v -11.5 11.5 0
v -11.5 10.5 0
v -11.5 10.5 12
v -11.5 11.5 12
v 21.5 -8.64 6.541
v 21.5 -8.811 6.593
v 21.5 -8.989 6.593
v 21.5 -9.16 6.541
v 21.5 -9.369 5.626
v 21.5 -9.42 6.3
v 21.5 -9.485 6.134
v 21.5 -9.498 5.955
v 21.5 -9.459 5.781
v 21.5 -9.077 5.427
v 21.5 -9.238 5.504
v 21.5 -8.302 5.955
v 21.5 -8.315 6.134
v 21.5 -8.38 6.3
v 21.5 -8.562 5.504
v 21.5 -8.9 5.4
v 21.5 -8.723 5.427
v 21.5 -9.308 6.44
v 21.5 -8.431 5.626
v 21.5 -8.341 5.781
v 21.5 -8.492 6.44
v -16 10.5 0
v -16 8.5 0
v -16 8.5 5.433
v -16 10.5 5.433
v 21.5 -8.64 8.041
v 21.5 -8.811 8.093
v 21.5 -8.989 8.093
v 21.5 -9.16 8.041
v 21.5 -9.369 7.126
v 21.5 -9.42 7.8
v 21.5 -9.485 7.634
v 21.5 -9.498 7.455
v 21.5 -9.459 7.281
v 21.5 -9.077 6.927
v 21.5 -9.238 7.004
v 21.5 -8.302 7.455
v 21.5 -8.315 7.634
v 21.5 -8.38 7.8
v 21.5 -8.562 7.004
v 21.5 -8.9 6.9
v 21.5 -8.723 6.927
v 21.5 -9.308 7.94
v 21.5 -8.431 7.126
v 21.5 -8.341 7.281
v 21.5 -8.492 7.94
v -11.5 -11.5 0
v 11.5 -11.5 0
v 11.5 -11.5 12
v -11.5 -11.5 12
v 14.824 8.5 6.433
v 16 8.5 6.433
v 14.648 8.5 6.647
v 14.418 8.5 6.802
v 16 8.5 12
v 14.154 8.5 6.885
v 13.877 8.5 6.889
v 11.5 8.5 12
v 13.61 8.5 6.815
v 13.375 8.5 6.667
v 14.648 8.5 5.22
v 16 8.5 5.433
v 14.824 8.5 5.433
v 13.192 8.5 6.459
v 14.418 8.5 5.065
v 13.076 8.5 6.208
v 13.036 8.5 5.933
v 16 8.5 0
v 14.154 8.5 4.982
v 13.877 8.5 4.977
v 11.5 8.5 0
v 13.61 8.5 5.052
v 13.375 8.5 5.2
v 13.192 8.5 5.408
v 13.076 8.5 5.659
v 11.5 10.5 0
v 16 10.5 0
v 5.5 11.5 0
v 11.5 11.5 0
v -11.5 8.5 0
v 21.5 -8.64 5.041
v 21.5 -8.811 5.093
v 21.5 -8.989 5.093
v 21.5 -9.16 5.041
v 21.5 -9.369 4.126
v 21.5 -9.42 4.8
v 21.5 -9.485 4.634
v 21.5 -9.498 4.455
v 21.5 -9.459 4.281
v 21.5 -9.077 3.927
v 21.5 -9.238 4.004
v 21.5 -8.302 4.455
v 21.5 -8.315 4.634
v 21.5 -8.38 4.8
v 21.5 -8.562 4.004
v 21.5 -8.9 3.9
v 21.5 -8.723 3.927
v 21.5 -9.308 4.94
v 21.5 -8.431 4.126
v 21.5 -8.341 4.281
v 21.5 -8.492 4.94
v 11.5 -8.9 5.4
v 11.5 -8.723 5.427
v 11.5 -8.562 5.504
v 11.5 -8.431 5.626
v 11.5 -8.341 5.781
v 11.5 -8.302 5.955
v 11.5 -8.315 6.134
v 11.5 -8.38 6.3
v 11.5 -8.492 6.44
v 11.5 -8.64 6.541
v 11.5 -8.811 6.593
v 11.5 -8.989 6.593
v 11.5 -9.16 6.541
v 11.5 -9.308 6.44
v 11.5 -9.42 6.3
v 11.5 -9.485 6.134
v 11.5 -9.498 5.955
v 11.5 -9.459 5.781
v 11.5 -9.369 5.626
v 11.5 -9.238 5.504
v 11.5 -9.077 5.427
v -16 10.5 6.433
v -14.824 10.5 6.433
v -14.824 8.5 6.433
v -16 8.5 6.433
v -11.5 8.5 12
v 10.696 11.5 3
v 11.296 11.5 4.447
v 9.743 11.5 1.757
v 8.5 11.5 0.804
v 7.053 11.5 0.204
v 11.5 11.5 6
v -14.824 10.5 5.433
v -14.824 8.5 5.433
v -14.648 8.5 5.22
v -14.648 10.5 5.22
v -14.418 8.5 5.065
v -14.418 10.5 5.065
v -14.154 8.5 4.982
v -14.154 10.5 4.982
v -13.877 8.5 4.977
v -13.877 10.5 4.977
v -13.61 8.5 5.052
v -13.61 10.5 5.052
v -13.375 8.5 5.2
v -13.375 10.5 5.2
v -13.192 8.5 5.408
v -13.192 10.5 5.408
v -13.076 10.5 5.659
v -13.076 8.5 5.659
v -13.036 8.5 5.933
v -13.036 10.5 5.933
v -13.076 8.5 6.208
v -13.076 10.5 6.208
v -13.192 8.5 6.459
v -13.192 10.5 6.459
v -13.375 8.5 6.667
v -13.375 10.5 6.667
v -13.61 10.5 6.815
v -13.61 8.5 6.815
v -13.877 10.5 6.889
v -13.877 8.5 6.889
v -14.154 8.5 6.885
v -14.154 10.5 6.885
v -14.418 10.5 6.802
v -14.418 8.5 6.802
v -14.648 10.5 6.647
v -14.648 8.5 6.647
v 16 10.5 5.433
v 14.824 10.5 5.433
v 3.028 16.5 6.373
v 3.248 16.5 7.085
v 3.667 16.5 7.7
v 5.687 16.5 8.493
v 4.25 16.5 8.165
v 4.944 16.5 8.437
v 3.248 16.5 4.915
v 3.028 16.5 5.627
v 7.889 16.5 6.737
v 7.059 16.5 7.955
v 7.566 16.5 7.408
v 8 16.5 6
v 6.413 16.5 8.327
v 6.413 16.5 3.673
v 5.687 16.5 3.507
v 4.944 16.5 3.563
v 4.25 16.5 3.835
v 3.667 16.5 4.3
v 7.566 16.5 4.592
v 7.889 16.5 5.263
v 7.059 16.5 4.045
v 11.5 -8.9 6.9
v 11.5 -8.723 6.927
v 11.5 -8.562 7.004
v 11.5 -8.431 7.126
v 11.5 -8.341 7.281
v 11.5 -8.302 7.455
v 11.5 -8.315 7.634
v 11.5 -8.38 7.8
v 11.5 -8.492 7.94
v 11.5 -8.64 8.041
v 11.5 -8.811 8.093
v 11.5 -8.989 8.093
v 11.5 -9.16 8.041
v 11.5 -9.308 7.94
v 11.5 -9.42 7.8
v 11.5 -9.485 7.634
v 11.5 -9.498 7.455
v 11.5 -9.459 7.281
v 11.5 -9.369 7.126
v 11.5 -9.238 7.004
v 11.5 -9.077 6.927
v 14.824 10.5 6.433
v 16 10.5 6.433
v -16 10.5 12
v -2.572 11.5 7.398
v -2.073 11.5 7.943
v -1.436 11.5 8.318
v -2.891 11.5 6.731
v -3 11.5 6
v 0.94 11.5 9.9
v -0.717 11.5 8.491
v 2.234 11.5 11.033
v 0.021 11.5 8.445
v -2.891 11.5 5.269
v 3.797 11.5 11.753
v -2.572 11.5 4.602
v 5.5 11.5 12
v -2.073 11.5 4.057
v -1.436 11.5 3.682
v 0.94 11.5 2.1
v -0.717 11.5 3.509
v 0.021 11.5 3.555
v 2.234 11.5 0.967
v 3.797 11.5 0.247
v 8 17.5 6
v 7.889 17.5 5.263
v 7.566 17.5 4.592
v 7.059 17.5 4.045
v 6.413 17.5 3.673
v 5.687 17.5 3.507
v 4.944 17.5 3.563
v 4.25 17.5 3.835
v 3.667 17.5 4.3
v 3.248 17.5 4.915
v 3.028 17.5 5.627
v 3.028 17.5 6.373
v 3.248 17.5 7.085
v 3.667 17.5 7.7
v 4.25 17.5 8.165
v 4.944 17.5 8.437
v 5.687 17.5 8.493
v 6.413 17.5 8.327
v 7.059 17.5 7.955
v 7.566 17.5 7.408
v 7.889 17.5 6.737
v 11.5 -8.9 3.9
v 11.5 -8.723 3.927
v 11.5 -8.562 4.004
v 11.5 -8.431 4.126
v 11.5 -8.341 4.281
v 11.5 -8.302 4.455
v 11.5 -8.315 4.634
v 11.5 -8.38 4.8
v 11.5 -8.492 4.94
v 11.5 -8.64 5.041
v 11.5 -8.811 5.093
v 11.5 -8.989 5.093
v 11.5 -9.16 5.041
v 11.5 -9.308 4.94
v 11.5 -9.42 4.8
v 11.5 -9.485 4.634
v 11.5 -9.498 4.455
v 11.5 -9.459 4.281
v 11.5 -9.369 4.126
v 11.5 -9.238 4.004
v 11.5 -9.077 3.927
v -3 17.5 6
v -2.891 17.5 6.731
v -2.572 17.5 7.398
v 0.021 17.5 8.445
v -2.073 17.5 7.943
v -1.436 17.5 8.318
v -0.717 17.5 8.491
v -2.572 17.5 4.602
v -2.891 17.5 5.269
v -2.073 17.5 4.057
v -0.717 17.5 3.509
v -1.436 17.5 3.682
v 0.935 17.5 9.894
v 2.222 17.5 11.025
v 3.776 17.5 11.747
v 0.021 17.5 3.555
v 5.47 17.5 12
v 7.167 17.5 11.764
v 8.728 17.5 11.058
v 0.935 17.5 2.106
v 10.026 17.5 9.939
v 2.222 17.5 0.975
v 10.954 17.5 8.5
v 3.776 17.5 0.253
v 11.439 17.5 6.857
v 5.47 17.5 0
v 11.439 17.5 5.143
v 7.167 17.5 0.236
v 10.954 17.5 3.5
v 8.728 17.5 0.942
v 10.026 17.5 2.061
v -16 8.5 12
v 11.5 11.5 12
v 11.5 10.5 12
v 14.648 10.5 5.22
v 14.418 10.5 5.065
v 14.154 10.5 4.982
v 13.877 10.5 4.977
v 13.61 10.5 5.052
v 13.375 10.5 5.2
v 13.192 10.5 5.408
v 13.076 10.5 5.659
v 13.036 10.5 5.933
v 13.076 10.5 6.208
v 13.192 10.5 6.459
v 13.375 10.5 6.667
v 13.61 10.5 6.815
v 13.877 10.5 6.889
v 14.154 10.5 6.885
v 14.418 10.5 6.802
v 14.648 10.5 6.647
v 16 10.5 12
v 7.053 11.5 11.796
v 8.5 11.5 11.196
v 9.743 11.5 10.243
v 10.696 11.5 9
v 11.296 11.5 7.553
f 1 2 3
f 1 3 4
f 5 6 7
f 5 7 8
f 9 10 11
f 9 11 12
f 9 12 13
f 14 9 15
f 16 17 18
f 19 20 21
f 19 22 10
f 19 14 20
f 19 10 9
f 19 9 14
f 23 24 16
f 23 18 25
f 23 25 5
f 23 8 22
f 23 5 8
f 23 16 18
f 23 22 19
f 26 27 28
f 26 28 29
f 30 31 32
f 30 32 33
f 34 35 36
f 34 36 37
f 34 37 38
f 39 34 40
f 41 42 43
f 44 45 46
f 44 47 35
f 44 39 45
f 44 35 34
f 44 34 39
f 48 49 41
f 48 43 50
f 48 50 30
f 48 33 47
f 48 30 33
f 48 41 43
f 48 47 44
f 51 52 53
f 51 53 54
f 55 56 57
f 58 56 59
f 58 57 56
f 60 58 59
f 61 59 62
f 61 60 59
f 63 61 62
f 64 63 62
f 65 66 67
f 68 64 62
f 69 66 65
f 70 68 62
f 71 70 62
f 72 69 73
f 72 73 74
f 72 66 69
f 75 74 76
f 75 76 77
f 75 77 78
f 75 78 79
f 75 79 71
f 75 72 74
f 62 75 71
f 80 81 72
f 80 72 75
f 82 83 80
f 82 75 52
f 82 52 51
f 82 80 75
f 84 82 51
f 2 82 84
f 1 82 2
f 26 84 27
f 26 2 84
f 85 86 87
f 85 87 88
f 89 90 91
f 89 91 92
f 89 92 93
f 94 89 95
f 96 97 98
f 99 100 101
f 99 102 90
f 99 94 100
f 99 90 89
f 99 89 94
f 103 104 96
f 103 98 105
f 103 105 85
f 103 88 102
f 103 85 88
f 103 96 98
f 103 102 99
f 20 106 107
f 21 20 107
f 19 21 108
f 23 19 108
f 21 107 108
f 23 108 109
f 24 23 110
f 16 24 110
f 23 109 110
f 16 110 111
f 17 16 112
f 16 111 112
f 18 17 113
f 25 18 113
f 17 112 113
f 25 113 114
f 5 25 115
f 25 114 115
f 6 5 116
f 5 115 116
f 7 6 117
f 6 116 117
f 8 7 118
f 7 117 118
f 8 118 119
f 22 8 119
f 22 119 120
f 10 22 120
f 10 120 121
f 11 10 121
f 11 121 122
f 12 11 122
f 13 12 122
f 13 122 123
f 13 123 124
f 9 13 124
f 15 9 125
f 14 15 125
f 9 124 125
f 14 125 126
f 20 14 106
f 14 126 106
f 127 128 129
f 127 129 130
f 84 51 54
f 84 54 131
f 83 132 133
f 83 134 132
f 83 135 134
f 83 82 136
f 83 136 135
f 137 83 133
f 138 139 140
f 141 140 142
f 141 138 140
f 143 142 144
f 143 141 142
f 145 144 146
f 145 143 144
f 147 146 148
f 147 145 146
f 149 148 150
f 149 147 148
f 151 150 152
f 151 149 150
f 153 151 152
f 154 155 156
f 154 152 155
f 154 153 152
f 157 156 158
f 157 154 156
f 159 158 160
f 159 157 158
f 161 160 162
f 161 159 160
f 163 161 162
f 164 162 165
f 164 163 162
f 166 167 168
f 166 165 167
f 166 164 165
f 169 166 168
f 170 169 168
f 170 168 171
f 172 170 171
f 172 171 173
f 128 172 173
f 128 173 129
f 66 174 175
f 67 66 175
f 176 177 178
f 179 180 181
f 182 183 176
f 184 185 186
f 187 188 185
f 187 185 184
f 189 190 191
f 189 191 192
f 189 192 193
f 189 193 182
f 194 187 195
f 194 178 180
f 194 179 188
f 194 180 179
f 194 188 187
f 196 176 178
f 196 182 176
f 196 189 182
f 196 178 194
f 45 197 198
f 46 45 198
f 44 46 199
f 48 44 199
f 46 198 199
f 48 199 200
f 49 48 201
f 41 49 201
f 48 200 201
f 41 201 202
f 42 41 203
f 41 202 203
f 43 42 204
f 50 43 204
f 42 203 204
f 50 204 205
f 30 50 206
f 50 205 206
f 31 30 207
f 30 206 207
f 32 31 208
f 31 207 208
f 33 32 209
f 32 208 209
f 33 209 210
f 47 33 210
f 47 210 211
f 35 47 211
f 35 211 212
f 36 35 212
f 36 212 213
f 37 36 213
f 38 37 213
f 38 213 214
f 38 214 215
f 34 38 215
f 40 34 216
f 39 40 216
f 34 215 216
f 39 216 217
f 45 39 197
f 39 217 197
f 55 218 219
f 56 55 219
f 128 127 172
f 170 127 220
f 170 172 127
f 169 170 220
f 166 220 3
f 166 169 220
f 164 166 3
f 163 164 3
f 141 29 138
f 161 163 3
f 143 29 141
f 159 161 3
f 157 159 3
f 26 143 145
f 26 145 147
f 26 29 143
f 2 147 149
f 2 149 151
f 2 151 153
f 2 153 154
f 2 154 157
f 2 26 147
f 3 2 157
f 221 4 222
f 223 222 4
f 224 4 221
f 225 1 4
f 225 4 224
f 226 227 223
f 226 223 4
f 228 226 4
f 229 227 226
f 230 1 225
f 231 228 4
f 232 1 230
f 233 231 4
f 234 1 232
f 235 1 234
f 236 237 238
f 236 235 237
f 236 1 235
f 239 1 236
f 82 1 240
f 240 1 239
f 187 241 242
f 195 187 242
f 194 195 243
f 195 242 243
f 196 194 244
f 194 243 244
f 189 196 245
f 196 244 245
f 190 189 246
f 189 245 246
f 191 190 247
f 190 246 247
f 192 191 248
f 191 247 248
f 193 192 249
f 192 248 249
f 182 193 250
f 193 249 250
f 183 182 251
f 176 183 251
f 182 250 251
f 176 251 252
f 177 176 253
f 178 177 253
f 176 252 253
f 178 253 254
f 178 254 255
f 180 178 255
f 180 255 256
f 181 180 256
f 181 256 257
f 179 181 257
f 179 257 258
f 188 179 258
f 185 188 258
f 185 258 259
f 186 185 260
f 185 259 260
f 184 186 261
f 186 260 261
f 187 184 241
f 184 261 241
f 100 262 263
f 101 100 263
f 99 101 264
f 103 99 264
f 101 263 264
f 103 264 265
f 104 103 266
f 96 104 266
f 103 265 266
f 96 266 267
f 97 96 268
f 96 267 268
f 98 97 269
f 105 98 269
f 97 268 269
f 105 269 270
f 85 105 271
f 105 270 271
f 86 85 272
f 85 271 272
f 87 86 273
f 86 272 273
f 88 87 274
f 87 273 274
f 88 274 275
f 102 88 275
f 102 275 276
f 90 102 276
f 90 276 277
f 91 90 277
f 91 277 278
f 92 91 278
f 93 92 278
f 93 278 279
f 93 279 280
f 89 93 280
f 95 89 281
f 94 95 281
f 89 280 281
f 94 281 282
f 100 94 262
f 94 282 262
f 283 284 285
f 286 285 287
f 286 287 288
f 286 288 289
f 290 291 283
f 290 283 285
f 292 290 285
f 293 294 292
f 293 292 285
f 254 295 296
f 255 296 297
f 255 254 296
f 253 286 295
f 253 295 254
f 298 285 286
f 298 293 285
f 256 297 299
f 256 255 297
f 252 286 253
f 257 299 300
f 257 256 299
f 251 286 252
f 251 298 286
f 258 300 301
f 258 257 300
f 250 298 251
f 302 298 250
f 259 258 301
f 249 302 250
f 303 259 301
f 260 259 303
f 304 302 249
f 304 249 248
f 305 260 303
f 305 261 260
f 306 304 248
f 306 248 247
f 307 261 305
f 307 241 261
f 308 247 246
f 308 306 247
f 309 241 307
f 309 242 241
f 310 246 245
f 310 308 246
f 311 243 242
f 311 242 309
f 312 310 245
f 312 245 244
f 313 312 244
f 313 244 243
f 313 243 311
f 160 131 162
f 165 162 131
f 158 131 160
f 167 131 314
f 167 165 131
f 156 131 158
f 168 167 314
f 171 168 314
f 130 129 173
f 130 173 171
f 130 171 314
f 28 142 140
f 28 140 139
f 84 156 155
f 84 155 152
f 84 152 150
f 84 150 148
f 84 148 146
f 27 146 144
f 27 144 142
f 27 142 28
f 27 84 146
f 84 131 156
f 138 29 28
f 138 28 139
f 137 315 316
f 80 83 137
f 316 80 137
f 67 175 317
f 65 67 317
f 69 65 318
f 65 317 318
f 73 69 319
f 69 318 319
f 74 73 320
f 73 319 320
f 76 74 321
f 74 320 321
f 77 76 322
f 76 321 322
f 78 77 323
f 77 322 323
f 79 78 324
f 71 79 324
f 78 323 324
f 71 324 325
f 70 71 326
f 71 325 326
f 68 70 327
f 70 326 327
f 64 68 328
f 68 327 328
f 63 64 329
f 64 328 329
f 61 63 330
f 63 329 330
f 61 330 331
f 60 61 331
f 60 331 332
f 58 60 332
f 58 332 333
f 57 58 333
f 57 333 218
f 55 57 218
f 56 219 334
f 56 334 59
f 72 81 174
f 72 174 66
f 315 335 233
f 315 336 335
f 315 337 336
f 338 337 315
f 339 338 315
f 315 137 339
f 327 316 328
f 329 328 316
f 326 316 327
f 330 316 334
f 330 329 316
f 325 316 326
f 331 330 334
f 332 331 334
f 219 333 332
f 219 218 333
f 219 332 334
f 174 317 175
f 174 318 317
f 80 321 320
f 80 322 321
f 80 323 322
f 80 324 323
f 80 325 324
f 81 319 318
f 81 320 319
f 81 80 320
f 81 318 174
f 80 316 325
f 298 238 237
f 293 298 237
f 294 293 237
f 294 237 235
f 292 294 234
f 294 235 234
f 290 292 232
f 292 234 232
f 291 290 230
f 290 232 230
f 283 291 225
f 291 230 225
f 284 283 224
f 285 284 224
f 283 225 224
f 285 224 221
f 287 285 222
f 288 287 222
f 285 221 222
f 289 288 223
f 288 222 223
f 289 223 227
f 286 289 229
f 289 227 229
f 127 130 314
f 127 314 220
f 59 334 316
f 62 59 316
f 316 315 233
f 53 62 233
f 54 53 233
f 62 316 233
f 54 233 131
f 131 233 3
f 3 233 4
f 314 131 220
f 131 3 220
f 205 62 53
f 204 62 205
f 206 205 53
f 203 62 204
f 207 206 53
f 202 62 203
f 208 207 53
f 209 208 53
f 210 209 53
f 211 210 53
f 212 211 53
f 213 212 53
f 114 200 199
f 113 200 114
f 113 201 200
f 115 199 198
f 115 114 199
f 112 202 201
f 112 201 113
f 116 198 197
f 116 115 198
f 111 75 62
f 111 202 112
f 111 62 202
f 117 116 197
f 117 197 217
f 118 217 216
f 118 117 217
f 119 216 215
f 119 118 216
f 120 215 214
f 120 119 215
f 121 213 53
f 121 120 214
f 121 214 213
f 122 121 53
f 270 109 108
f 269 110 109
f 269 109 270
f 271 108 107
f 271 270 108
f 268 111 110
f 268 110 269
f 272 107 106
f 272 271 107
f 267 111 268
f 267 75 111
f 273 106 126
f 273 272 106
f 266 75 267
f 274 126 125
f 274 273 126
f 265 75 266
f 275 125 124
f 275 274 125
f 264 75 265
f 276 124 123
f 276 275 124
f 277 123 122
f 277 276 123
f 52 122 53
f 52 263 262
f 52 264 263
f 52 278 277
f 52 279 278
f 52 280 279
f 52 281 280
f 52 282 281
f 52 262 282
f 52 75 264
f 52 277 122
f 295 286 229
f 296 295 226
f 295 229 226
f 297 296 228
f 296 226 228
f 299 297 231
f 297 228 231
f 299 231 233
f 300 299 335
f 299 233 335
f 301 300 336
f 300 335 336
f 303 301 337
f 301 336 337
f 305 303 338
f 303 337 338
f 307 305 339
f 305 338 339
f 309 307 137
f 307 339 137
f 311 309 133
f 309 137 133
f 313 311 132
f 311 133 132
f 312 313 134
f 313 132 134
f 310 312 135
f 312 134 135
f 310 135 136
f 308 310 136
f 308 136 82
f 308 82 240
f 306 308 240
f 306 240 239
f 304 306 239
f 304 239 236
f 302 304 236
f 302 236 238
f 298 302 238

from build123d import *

# Parameters (mm, degrees)
EXTRUDE_1_DEPTH     = 12
EXTRUDE_2_DEPTH     = 6
CUT_EXTRUDE_1_DEPTH = 5
SKETCH_6_R          = 0.6
EXTRUDE_5_DEPTH     = 10
SKETCH_3_R          = 2.5
CUT_EXTRUDE_2_DEPTH = 1


with BuildPart() as part:
    # 草图1 → 凸台-拉伸1 (new body)
    with BuildSketch(Plane.XY):
        Polygon((-11.5, 11.5), (11.5, 11.5), (11.5, 10.5), (16, 10.5), (16, 8.5), (11.5, 8.5), (11.5, -11.5), (-11.5, -11.5), (-11.5, 8.5), (-16, 8.5), (-16, 10.5), (-11.5, 10.5), align=None)
    extrude(amount=EXTRUDE_1_DEPTH)

    # 草图2 → 凸台-拉伸2 (add)
    with BuildSketch(Plane(origin=(0, 11.5, 0), x_dir=(1, 0, 0), z_dir=(0, 1, 0))):
        with BuildLine():
            ThreePointArc((0.020833333, -8.445144707), (11.5, -6), (0.020833333, -3.554855293))
            ThreePointArc((0.020833333, -3.554855293), (-3, -6), (0.020833333, -8.445144707))
        make_face()
    extrude(amount=EXTRUDE_2_DEPTH)

    # 草图4 → 切除-拉伸1 (cut)
    with BuildSketch(Plane(origin=(0, 10.5, 0), x_dir=(1, 0, 0), z_dir=(0, 1, 0))):
        with BuildLine():
            Line((16, -5.433355599), (14.823962452, -5.433355599))
            ThreePointArc((14.823962452, -5.433355599), (13.036198089, -5.933355599), (14.823962452, -6.433355599))
            Line((14.823962452, -6.433355599), (16, -6.433355599))
            Line((16, -6.433355599), (16, -5.433355599))
        make_face()
        with BuildLine():
            Line((-16, -5.433355599), (-14.823962452, -5.433355599))
            ThreePointArc((-14.823962452, -5.433355599), (-13.036198089, -5.933355599), (-14.823962452, -6.433355599))
            Line((-14.823962452, -6.433355599), (-16, -6.433355599))
            Line((-16, -6.433355599), (-16, -5.433355599))
        make_face()
    extrude(amount=-CUT_EXTRUDE_1_DEPTH, mode=Mode.SUBTRACT)

    # 草图6 → 凸台-拉伸5 (add)
    with BuildSketch(Plane(origin=(11.5, 0, 0), x_dir=(0, 0, -1), z_dir=(1, 0, 0))):
        with Locations((-6, -8.9)):
            Circle(SKETCH_6_R)
        with Locations((-7.5, -8.9)):
            Circle(SKETCH_6_R)
        with Locations((-4.5, -8.9)):
            Circle(SKETCH_6_R)
    extrude(amount=EXTRUDE_5_DEPTH)

    # 草图3 → 切除-拉伸2 (cut)
    with BuildSketch(Plane(origin=(0, 17.5, 0), x_dir=(1, 0, 0), z_dir=(0, 1, 0))):
        with Locations((5.5, -6)):
            Circle(SKETCH_3_R)
    extrude(amount=-CUT_EXTRUDE_2_DEPTH, mode=Mode.SUBTRACT)


solid = part.part
